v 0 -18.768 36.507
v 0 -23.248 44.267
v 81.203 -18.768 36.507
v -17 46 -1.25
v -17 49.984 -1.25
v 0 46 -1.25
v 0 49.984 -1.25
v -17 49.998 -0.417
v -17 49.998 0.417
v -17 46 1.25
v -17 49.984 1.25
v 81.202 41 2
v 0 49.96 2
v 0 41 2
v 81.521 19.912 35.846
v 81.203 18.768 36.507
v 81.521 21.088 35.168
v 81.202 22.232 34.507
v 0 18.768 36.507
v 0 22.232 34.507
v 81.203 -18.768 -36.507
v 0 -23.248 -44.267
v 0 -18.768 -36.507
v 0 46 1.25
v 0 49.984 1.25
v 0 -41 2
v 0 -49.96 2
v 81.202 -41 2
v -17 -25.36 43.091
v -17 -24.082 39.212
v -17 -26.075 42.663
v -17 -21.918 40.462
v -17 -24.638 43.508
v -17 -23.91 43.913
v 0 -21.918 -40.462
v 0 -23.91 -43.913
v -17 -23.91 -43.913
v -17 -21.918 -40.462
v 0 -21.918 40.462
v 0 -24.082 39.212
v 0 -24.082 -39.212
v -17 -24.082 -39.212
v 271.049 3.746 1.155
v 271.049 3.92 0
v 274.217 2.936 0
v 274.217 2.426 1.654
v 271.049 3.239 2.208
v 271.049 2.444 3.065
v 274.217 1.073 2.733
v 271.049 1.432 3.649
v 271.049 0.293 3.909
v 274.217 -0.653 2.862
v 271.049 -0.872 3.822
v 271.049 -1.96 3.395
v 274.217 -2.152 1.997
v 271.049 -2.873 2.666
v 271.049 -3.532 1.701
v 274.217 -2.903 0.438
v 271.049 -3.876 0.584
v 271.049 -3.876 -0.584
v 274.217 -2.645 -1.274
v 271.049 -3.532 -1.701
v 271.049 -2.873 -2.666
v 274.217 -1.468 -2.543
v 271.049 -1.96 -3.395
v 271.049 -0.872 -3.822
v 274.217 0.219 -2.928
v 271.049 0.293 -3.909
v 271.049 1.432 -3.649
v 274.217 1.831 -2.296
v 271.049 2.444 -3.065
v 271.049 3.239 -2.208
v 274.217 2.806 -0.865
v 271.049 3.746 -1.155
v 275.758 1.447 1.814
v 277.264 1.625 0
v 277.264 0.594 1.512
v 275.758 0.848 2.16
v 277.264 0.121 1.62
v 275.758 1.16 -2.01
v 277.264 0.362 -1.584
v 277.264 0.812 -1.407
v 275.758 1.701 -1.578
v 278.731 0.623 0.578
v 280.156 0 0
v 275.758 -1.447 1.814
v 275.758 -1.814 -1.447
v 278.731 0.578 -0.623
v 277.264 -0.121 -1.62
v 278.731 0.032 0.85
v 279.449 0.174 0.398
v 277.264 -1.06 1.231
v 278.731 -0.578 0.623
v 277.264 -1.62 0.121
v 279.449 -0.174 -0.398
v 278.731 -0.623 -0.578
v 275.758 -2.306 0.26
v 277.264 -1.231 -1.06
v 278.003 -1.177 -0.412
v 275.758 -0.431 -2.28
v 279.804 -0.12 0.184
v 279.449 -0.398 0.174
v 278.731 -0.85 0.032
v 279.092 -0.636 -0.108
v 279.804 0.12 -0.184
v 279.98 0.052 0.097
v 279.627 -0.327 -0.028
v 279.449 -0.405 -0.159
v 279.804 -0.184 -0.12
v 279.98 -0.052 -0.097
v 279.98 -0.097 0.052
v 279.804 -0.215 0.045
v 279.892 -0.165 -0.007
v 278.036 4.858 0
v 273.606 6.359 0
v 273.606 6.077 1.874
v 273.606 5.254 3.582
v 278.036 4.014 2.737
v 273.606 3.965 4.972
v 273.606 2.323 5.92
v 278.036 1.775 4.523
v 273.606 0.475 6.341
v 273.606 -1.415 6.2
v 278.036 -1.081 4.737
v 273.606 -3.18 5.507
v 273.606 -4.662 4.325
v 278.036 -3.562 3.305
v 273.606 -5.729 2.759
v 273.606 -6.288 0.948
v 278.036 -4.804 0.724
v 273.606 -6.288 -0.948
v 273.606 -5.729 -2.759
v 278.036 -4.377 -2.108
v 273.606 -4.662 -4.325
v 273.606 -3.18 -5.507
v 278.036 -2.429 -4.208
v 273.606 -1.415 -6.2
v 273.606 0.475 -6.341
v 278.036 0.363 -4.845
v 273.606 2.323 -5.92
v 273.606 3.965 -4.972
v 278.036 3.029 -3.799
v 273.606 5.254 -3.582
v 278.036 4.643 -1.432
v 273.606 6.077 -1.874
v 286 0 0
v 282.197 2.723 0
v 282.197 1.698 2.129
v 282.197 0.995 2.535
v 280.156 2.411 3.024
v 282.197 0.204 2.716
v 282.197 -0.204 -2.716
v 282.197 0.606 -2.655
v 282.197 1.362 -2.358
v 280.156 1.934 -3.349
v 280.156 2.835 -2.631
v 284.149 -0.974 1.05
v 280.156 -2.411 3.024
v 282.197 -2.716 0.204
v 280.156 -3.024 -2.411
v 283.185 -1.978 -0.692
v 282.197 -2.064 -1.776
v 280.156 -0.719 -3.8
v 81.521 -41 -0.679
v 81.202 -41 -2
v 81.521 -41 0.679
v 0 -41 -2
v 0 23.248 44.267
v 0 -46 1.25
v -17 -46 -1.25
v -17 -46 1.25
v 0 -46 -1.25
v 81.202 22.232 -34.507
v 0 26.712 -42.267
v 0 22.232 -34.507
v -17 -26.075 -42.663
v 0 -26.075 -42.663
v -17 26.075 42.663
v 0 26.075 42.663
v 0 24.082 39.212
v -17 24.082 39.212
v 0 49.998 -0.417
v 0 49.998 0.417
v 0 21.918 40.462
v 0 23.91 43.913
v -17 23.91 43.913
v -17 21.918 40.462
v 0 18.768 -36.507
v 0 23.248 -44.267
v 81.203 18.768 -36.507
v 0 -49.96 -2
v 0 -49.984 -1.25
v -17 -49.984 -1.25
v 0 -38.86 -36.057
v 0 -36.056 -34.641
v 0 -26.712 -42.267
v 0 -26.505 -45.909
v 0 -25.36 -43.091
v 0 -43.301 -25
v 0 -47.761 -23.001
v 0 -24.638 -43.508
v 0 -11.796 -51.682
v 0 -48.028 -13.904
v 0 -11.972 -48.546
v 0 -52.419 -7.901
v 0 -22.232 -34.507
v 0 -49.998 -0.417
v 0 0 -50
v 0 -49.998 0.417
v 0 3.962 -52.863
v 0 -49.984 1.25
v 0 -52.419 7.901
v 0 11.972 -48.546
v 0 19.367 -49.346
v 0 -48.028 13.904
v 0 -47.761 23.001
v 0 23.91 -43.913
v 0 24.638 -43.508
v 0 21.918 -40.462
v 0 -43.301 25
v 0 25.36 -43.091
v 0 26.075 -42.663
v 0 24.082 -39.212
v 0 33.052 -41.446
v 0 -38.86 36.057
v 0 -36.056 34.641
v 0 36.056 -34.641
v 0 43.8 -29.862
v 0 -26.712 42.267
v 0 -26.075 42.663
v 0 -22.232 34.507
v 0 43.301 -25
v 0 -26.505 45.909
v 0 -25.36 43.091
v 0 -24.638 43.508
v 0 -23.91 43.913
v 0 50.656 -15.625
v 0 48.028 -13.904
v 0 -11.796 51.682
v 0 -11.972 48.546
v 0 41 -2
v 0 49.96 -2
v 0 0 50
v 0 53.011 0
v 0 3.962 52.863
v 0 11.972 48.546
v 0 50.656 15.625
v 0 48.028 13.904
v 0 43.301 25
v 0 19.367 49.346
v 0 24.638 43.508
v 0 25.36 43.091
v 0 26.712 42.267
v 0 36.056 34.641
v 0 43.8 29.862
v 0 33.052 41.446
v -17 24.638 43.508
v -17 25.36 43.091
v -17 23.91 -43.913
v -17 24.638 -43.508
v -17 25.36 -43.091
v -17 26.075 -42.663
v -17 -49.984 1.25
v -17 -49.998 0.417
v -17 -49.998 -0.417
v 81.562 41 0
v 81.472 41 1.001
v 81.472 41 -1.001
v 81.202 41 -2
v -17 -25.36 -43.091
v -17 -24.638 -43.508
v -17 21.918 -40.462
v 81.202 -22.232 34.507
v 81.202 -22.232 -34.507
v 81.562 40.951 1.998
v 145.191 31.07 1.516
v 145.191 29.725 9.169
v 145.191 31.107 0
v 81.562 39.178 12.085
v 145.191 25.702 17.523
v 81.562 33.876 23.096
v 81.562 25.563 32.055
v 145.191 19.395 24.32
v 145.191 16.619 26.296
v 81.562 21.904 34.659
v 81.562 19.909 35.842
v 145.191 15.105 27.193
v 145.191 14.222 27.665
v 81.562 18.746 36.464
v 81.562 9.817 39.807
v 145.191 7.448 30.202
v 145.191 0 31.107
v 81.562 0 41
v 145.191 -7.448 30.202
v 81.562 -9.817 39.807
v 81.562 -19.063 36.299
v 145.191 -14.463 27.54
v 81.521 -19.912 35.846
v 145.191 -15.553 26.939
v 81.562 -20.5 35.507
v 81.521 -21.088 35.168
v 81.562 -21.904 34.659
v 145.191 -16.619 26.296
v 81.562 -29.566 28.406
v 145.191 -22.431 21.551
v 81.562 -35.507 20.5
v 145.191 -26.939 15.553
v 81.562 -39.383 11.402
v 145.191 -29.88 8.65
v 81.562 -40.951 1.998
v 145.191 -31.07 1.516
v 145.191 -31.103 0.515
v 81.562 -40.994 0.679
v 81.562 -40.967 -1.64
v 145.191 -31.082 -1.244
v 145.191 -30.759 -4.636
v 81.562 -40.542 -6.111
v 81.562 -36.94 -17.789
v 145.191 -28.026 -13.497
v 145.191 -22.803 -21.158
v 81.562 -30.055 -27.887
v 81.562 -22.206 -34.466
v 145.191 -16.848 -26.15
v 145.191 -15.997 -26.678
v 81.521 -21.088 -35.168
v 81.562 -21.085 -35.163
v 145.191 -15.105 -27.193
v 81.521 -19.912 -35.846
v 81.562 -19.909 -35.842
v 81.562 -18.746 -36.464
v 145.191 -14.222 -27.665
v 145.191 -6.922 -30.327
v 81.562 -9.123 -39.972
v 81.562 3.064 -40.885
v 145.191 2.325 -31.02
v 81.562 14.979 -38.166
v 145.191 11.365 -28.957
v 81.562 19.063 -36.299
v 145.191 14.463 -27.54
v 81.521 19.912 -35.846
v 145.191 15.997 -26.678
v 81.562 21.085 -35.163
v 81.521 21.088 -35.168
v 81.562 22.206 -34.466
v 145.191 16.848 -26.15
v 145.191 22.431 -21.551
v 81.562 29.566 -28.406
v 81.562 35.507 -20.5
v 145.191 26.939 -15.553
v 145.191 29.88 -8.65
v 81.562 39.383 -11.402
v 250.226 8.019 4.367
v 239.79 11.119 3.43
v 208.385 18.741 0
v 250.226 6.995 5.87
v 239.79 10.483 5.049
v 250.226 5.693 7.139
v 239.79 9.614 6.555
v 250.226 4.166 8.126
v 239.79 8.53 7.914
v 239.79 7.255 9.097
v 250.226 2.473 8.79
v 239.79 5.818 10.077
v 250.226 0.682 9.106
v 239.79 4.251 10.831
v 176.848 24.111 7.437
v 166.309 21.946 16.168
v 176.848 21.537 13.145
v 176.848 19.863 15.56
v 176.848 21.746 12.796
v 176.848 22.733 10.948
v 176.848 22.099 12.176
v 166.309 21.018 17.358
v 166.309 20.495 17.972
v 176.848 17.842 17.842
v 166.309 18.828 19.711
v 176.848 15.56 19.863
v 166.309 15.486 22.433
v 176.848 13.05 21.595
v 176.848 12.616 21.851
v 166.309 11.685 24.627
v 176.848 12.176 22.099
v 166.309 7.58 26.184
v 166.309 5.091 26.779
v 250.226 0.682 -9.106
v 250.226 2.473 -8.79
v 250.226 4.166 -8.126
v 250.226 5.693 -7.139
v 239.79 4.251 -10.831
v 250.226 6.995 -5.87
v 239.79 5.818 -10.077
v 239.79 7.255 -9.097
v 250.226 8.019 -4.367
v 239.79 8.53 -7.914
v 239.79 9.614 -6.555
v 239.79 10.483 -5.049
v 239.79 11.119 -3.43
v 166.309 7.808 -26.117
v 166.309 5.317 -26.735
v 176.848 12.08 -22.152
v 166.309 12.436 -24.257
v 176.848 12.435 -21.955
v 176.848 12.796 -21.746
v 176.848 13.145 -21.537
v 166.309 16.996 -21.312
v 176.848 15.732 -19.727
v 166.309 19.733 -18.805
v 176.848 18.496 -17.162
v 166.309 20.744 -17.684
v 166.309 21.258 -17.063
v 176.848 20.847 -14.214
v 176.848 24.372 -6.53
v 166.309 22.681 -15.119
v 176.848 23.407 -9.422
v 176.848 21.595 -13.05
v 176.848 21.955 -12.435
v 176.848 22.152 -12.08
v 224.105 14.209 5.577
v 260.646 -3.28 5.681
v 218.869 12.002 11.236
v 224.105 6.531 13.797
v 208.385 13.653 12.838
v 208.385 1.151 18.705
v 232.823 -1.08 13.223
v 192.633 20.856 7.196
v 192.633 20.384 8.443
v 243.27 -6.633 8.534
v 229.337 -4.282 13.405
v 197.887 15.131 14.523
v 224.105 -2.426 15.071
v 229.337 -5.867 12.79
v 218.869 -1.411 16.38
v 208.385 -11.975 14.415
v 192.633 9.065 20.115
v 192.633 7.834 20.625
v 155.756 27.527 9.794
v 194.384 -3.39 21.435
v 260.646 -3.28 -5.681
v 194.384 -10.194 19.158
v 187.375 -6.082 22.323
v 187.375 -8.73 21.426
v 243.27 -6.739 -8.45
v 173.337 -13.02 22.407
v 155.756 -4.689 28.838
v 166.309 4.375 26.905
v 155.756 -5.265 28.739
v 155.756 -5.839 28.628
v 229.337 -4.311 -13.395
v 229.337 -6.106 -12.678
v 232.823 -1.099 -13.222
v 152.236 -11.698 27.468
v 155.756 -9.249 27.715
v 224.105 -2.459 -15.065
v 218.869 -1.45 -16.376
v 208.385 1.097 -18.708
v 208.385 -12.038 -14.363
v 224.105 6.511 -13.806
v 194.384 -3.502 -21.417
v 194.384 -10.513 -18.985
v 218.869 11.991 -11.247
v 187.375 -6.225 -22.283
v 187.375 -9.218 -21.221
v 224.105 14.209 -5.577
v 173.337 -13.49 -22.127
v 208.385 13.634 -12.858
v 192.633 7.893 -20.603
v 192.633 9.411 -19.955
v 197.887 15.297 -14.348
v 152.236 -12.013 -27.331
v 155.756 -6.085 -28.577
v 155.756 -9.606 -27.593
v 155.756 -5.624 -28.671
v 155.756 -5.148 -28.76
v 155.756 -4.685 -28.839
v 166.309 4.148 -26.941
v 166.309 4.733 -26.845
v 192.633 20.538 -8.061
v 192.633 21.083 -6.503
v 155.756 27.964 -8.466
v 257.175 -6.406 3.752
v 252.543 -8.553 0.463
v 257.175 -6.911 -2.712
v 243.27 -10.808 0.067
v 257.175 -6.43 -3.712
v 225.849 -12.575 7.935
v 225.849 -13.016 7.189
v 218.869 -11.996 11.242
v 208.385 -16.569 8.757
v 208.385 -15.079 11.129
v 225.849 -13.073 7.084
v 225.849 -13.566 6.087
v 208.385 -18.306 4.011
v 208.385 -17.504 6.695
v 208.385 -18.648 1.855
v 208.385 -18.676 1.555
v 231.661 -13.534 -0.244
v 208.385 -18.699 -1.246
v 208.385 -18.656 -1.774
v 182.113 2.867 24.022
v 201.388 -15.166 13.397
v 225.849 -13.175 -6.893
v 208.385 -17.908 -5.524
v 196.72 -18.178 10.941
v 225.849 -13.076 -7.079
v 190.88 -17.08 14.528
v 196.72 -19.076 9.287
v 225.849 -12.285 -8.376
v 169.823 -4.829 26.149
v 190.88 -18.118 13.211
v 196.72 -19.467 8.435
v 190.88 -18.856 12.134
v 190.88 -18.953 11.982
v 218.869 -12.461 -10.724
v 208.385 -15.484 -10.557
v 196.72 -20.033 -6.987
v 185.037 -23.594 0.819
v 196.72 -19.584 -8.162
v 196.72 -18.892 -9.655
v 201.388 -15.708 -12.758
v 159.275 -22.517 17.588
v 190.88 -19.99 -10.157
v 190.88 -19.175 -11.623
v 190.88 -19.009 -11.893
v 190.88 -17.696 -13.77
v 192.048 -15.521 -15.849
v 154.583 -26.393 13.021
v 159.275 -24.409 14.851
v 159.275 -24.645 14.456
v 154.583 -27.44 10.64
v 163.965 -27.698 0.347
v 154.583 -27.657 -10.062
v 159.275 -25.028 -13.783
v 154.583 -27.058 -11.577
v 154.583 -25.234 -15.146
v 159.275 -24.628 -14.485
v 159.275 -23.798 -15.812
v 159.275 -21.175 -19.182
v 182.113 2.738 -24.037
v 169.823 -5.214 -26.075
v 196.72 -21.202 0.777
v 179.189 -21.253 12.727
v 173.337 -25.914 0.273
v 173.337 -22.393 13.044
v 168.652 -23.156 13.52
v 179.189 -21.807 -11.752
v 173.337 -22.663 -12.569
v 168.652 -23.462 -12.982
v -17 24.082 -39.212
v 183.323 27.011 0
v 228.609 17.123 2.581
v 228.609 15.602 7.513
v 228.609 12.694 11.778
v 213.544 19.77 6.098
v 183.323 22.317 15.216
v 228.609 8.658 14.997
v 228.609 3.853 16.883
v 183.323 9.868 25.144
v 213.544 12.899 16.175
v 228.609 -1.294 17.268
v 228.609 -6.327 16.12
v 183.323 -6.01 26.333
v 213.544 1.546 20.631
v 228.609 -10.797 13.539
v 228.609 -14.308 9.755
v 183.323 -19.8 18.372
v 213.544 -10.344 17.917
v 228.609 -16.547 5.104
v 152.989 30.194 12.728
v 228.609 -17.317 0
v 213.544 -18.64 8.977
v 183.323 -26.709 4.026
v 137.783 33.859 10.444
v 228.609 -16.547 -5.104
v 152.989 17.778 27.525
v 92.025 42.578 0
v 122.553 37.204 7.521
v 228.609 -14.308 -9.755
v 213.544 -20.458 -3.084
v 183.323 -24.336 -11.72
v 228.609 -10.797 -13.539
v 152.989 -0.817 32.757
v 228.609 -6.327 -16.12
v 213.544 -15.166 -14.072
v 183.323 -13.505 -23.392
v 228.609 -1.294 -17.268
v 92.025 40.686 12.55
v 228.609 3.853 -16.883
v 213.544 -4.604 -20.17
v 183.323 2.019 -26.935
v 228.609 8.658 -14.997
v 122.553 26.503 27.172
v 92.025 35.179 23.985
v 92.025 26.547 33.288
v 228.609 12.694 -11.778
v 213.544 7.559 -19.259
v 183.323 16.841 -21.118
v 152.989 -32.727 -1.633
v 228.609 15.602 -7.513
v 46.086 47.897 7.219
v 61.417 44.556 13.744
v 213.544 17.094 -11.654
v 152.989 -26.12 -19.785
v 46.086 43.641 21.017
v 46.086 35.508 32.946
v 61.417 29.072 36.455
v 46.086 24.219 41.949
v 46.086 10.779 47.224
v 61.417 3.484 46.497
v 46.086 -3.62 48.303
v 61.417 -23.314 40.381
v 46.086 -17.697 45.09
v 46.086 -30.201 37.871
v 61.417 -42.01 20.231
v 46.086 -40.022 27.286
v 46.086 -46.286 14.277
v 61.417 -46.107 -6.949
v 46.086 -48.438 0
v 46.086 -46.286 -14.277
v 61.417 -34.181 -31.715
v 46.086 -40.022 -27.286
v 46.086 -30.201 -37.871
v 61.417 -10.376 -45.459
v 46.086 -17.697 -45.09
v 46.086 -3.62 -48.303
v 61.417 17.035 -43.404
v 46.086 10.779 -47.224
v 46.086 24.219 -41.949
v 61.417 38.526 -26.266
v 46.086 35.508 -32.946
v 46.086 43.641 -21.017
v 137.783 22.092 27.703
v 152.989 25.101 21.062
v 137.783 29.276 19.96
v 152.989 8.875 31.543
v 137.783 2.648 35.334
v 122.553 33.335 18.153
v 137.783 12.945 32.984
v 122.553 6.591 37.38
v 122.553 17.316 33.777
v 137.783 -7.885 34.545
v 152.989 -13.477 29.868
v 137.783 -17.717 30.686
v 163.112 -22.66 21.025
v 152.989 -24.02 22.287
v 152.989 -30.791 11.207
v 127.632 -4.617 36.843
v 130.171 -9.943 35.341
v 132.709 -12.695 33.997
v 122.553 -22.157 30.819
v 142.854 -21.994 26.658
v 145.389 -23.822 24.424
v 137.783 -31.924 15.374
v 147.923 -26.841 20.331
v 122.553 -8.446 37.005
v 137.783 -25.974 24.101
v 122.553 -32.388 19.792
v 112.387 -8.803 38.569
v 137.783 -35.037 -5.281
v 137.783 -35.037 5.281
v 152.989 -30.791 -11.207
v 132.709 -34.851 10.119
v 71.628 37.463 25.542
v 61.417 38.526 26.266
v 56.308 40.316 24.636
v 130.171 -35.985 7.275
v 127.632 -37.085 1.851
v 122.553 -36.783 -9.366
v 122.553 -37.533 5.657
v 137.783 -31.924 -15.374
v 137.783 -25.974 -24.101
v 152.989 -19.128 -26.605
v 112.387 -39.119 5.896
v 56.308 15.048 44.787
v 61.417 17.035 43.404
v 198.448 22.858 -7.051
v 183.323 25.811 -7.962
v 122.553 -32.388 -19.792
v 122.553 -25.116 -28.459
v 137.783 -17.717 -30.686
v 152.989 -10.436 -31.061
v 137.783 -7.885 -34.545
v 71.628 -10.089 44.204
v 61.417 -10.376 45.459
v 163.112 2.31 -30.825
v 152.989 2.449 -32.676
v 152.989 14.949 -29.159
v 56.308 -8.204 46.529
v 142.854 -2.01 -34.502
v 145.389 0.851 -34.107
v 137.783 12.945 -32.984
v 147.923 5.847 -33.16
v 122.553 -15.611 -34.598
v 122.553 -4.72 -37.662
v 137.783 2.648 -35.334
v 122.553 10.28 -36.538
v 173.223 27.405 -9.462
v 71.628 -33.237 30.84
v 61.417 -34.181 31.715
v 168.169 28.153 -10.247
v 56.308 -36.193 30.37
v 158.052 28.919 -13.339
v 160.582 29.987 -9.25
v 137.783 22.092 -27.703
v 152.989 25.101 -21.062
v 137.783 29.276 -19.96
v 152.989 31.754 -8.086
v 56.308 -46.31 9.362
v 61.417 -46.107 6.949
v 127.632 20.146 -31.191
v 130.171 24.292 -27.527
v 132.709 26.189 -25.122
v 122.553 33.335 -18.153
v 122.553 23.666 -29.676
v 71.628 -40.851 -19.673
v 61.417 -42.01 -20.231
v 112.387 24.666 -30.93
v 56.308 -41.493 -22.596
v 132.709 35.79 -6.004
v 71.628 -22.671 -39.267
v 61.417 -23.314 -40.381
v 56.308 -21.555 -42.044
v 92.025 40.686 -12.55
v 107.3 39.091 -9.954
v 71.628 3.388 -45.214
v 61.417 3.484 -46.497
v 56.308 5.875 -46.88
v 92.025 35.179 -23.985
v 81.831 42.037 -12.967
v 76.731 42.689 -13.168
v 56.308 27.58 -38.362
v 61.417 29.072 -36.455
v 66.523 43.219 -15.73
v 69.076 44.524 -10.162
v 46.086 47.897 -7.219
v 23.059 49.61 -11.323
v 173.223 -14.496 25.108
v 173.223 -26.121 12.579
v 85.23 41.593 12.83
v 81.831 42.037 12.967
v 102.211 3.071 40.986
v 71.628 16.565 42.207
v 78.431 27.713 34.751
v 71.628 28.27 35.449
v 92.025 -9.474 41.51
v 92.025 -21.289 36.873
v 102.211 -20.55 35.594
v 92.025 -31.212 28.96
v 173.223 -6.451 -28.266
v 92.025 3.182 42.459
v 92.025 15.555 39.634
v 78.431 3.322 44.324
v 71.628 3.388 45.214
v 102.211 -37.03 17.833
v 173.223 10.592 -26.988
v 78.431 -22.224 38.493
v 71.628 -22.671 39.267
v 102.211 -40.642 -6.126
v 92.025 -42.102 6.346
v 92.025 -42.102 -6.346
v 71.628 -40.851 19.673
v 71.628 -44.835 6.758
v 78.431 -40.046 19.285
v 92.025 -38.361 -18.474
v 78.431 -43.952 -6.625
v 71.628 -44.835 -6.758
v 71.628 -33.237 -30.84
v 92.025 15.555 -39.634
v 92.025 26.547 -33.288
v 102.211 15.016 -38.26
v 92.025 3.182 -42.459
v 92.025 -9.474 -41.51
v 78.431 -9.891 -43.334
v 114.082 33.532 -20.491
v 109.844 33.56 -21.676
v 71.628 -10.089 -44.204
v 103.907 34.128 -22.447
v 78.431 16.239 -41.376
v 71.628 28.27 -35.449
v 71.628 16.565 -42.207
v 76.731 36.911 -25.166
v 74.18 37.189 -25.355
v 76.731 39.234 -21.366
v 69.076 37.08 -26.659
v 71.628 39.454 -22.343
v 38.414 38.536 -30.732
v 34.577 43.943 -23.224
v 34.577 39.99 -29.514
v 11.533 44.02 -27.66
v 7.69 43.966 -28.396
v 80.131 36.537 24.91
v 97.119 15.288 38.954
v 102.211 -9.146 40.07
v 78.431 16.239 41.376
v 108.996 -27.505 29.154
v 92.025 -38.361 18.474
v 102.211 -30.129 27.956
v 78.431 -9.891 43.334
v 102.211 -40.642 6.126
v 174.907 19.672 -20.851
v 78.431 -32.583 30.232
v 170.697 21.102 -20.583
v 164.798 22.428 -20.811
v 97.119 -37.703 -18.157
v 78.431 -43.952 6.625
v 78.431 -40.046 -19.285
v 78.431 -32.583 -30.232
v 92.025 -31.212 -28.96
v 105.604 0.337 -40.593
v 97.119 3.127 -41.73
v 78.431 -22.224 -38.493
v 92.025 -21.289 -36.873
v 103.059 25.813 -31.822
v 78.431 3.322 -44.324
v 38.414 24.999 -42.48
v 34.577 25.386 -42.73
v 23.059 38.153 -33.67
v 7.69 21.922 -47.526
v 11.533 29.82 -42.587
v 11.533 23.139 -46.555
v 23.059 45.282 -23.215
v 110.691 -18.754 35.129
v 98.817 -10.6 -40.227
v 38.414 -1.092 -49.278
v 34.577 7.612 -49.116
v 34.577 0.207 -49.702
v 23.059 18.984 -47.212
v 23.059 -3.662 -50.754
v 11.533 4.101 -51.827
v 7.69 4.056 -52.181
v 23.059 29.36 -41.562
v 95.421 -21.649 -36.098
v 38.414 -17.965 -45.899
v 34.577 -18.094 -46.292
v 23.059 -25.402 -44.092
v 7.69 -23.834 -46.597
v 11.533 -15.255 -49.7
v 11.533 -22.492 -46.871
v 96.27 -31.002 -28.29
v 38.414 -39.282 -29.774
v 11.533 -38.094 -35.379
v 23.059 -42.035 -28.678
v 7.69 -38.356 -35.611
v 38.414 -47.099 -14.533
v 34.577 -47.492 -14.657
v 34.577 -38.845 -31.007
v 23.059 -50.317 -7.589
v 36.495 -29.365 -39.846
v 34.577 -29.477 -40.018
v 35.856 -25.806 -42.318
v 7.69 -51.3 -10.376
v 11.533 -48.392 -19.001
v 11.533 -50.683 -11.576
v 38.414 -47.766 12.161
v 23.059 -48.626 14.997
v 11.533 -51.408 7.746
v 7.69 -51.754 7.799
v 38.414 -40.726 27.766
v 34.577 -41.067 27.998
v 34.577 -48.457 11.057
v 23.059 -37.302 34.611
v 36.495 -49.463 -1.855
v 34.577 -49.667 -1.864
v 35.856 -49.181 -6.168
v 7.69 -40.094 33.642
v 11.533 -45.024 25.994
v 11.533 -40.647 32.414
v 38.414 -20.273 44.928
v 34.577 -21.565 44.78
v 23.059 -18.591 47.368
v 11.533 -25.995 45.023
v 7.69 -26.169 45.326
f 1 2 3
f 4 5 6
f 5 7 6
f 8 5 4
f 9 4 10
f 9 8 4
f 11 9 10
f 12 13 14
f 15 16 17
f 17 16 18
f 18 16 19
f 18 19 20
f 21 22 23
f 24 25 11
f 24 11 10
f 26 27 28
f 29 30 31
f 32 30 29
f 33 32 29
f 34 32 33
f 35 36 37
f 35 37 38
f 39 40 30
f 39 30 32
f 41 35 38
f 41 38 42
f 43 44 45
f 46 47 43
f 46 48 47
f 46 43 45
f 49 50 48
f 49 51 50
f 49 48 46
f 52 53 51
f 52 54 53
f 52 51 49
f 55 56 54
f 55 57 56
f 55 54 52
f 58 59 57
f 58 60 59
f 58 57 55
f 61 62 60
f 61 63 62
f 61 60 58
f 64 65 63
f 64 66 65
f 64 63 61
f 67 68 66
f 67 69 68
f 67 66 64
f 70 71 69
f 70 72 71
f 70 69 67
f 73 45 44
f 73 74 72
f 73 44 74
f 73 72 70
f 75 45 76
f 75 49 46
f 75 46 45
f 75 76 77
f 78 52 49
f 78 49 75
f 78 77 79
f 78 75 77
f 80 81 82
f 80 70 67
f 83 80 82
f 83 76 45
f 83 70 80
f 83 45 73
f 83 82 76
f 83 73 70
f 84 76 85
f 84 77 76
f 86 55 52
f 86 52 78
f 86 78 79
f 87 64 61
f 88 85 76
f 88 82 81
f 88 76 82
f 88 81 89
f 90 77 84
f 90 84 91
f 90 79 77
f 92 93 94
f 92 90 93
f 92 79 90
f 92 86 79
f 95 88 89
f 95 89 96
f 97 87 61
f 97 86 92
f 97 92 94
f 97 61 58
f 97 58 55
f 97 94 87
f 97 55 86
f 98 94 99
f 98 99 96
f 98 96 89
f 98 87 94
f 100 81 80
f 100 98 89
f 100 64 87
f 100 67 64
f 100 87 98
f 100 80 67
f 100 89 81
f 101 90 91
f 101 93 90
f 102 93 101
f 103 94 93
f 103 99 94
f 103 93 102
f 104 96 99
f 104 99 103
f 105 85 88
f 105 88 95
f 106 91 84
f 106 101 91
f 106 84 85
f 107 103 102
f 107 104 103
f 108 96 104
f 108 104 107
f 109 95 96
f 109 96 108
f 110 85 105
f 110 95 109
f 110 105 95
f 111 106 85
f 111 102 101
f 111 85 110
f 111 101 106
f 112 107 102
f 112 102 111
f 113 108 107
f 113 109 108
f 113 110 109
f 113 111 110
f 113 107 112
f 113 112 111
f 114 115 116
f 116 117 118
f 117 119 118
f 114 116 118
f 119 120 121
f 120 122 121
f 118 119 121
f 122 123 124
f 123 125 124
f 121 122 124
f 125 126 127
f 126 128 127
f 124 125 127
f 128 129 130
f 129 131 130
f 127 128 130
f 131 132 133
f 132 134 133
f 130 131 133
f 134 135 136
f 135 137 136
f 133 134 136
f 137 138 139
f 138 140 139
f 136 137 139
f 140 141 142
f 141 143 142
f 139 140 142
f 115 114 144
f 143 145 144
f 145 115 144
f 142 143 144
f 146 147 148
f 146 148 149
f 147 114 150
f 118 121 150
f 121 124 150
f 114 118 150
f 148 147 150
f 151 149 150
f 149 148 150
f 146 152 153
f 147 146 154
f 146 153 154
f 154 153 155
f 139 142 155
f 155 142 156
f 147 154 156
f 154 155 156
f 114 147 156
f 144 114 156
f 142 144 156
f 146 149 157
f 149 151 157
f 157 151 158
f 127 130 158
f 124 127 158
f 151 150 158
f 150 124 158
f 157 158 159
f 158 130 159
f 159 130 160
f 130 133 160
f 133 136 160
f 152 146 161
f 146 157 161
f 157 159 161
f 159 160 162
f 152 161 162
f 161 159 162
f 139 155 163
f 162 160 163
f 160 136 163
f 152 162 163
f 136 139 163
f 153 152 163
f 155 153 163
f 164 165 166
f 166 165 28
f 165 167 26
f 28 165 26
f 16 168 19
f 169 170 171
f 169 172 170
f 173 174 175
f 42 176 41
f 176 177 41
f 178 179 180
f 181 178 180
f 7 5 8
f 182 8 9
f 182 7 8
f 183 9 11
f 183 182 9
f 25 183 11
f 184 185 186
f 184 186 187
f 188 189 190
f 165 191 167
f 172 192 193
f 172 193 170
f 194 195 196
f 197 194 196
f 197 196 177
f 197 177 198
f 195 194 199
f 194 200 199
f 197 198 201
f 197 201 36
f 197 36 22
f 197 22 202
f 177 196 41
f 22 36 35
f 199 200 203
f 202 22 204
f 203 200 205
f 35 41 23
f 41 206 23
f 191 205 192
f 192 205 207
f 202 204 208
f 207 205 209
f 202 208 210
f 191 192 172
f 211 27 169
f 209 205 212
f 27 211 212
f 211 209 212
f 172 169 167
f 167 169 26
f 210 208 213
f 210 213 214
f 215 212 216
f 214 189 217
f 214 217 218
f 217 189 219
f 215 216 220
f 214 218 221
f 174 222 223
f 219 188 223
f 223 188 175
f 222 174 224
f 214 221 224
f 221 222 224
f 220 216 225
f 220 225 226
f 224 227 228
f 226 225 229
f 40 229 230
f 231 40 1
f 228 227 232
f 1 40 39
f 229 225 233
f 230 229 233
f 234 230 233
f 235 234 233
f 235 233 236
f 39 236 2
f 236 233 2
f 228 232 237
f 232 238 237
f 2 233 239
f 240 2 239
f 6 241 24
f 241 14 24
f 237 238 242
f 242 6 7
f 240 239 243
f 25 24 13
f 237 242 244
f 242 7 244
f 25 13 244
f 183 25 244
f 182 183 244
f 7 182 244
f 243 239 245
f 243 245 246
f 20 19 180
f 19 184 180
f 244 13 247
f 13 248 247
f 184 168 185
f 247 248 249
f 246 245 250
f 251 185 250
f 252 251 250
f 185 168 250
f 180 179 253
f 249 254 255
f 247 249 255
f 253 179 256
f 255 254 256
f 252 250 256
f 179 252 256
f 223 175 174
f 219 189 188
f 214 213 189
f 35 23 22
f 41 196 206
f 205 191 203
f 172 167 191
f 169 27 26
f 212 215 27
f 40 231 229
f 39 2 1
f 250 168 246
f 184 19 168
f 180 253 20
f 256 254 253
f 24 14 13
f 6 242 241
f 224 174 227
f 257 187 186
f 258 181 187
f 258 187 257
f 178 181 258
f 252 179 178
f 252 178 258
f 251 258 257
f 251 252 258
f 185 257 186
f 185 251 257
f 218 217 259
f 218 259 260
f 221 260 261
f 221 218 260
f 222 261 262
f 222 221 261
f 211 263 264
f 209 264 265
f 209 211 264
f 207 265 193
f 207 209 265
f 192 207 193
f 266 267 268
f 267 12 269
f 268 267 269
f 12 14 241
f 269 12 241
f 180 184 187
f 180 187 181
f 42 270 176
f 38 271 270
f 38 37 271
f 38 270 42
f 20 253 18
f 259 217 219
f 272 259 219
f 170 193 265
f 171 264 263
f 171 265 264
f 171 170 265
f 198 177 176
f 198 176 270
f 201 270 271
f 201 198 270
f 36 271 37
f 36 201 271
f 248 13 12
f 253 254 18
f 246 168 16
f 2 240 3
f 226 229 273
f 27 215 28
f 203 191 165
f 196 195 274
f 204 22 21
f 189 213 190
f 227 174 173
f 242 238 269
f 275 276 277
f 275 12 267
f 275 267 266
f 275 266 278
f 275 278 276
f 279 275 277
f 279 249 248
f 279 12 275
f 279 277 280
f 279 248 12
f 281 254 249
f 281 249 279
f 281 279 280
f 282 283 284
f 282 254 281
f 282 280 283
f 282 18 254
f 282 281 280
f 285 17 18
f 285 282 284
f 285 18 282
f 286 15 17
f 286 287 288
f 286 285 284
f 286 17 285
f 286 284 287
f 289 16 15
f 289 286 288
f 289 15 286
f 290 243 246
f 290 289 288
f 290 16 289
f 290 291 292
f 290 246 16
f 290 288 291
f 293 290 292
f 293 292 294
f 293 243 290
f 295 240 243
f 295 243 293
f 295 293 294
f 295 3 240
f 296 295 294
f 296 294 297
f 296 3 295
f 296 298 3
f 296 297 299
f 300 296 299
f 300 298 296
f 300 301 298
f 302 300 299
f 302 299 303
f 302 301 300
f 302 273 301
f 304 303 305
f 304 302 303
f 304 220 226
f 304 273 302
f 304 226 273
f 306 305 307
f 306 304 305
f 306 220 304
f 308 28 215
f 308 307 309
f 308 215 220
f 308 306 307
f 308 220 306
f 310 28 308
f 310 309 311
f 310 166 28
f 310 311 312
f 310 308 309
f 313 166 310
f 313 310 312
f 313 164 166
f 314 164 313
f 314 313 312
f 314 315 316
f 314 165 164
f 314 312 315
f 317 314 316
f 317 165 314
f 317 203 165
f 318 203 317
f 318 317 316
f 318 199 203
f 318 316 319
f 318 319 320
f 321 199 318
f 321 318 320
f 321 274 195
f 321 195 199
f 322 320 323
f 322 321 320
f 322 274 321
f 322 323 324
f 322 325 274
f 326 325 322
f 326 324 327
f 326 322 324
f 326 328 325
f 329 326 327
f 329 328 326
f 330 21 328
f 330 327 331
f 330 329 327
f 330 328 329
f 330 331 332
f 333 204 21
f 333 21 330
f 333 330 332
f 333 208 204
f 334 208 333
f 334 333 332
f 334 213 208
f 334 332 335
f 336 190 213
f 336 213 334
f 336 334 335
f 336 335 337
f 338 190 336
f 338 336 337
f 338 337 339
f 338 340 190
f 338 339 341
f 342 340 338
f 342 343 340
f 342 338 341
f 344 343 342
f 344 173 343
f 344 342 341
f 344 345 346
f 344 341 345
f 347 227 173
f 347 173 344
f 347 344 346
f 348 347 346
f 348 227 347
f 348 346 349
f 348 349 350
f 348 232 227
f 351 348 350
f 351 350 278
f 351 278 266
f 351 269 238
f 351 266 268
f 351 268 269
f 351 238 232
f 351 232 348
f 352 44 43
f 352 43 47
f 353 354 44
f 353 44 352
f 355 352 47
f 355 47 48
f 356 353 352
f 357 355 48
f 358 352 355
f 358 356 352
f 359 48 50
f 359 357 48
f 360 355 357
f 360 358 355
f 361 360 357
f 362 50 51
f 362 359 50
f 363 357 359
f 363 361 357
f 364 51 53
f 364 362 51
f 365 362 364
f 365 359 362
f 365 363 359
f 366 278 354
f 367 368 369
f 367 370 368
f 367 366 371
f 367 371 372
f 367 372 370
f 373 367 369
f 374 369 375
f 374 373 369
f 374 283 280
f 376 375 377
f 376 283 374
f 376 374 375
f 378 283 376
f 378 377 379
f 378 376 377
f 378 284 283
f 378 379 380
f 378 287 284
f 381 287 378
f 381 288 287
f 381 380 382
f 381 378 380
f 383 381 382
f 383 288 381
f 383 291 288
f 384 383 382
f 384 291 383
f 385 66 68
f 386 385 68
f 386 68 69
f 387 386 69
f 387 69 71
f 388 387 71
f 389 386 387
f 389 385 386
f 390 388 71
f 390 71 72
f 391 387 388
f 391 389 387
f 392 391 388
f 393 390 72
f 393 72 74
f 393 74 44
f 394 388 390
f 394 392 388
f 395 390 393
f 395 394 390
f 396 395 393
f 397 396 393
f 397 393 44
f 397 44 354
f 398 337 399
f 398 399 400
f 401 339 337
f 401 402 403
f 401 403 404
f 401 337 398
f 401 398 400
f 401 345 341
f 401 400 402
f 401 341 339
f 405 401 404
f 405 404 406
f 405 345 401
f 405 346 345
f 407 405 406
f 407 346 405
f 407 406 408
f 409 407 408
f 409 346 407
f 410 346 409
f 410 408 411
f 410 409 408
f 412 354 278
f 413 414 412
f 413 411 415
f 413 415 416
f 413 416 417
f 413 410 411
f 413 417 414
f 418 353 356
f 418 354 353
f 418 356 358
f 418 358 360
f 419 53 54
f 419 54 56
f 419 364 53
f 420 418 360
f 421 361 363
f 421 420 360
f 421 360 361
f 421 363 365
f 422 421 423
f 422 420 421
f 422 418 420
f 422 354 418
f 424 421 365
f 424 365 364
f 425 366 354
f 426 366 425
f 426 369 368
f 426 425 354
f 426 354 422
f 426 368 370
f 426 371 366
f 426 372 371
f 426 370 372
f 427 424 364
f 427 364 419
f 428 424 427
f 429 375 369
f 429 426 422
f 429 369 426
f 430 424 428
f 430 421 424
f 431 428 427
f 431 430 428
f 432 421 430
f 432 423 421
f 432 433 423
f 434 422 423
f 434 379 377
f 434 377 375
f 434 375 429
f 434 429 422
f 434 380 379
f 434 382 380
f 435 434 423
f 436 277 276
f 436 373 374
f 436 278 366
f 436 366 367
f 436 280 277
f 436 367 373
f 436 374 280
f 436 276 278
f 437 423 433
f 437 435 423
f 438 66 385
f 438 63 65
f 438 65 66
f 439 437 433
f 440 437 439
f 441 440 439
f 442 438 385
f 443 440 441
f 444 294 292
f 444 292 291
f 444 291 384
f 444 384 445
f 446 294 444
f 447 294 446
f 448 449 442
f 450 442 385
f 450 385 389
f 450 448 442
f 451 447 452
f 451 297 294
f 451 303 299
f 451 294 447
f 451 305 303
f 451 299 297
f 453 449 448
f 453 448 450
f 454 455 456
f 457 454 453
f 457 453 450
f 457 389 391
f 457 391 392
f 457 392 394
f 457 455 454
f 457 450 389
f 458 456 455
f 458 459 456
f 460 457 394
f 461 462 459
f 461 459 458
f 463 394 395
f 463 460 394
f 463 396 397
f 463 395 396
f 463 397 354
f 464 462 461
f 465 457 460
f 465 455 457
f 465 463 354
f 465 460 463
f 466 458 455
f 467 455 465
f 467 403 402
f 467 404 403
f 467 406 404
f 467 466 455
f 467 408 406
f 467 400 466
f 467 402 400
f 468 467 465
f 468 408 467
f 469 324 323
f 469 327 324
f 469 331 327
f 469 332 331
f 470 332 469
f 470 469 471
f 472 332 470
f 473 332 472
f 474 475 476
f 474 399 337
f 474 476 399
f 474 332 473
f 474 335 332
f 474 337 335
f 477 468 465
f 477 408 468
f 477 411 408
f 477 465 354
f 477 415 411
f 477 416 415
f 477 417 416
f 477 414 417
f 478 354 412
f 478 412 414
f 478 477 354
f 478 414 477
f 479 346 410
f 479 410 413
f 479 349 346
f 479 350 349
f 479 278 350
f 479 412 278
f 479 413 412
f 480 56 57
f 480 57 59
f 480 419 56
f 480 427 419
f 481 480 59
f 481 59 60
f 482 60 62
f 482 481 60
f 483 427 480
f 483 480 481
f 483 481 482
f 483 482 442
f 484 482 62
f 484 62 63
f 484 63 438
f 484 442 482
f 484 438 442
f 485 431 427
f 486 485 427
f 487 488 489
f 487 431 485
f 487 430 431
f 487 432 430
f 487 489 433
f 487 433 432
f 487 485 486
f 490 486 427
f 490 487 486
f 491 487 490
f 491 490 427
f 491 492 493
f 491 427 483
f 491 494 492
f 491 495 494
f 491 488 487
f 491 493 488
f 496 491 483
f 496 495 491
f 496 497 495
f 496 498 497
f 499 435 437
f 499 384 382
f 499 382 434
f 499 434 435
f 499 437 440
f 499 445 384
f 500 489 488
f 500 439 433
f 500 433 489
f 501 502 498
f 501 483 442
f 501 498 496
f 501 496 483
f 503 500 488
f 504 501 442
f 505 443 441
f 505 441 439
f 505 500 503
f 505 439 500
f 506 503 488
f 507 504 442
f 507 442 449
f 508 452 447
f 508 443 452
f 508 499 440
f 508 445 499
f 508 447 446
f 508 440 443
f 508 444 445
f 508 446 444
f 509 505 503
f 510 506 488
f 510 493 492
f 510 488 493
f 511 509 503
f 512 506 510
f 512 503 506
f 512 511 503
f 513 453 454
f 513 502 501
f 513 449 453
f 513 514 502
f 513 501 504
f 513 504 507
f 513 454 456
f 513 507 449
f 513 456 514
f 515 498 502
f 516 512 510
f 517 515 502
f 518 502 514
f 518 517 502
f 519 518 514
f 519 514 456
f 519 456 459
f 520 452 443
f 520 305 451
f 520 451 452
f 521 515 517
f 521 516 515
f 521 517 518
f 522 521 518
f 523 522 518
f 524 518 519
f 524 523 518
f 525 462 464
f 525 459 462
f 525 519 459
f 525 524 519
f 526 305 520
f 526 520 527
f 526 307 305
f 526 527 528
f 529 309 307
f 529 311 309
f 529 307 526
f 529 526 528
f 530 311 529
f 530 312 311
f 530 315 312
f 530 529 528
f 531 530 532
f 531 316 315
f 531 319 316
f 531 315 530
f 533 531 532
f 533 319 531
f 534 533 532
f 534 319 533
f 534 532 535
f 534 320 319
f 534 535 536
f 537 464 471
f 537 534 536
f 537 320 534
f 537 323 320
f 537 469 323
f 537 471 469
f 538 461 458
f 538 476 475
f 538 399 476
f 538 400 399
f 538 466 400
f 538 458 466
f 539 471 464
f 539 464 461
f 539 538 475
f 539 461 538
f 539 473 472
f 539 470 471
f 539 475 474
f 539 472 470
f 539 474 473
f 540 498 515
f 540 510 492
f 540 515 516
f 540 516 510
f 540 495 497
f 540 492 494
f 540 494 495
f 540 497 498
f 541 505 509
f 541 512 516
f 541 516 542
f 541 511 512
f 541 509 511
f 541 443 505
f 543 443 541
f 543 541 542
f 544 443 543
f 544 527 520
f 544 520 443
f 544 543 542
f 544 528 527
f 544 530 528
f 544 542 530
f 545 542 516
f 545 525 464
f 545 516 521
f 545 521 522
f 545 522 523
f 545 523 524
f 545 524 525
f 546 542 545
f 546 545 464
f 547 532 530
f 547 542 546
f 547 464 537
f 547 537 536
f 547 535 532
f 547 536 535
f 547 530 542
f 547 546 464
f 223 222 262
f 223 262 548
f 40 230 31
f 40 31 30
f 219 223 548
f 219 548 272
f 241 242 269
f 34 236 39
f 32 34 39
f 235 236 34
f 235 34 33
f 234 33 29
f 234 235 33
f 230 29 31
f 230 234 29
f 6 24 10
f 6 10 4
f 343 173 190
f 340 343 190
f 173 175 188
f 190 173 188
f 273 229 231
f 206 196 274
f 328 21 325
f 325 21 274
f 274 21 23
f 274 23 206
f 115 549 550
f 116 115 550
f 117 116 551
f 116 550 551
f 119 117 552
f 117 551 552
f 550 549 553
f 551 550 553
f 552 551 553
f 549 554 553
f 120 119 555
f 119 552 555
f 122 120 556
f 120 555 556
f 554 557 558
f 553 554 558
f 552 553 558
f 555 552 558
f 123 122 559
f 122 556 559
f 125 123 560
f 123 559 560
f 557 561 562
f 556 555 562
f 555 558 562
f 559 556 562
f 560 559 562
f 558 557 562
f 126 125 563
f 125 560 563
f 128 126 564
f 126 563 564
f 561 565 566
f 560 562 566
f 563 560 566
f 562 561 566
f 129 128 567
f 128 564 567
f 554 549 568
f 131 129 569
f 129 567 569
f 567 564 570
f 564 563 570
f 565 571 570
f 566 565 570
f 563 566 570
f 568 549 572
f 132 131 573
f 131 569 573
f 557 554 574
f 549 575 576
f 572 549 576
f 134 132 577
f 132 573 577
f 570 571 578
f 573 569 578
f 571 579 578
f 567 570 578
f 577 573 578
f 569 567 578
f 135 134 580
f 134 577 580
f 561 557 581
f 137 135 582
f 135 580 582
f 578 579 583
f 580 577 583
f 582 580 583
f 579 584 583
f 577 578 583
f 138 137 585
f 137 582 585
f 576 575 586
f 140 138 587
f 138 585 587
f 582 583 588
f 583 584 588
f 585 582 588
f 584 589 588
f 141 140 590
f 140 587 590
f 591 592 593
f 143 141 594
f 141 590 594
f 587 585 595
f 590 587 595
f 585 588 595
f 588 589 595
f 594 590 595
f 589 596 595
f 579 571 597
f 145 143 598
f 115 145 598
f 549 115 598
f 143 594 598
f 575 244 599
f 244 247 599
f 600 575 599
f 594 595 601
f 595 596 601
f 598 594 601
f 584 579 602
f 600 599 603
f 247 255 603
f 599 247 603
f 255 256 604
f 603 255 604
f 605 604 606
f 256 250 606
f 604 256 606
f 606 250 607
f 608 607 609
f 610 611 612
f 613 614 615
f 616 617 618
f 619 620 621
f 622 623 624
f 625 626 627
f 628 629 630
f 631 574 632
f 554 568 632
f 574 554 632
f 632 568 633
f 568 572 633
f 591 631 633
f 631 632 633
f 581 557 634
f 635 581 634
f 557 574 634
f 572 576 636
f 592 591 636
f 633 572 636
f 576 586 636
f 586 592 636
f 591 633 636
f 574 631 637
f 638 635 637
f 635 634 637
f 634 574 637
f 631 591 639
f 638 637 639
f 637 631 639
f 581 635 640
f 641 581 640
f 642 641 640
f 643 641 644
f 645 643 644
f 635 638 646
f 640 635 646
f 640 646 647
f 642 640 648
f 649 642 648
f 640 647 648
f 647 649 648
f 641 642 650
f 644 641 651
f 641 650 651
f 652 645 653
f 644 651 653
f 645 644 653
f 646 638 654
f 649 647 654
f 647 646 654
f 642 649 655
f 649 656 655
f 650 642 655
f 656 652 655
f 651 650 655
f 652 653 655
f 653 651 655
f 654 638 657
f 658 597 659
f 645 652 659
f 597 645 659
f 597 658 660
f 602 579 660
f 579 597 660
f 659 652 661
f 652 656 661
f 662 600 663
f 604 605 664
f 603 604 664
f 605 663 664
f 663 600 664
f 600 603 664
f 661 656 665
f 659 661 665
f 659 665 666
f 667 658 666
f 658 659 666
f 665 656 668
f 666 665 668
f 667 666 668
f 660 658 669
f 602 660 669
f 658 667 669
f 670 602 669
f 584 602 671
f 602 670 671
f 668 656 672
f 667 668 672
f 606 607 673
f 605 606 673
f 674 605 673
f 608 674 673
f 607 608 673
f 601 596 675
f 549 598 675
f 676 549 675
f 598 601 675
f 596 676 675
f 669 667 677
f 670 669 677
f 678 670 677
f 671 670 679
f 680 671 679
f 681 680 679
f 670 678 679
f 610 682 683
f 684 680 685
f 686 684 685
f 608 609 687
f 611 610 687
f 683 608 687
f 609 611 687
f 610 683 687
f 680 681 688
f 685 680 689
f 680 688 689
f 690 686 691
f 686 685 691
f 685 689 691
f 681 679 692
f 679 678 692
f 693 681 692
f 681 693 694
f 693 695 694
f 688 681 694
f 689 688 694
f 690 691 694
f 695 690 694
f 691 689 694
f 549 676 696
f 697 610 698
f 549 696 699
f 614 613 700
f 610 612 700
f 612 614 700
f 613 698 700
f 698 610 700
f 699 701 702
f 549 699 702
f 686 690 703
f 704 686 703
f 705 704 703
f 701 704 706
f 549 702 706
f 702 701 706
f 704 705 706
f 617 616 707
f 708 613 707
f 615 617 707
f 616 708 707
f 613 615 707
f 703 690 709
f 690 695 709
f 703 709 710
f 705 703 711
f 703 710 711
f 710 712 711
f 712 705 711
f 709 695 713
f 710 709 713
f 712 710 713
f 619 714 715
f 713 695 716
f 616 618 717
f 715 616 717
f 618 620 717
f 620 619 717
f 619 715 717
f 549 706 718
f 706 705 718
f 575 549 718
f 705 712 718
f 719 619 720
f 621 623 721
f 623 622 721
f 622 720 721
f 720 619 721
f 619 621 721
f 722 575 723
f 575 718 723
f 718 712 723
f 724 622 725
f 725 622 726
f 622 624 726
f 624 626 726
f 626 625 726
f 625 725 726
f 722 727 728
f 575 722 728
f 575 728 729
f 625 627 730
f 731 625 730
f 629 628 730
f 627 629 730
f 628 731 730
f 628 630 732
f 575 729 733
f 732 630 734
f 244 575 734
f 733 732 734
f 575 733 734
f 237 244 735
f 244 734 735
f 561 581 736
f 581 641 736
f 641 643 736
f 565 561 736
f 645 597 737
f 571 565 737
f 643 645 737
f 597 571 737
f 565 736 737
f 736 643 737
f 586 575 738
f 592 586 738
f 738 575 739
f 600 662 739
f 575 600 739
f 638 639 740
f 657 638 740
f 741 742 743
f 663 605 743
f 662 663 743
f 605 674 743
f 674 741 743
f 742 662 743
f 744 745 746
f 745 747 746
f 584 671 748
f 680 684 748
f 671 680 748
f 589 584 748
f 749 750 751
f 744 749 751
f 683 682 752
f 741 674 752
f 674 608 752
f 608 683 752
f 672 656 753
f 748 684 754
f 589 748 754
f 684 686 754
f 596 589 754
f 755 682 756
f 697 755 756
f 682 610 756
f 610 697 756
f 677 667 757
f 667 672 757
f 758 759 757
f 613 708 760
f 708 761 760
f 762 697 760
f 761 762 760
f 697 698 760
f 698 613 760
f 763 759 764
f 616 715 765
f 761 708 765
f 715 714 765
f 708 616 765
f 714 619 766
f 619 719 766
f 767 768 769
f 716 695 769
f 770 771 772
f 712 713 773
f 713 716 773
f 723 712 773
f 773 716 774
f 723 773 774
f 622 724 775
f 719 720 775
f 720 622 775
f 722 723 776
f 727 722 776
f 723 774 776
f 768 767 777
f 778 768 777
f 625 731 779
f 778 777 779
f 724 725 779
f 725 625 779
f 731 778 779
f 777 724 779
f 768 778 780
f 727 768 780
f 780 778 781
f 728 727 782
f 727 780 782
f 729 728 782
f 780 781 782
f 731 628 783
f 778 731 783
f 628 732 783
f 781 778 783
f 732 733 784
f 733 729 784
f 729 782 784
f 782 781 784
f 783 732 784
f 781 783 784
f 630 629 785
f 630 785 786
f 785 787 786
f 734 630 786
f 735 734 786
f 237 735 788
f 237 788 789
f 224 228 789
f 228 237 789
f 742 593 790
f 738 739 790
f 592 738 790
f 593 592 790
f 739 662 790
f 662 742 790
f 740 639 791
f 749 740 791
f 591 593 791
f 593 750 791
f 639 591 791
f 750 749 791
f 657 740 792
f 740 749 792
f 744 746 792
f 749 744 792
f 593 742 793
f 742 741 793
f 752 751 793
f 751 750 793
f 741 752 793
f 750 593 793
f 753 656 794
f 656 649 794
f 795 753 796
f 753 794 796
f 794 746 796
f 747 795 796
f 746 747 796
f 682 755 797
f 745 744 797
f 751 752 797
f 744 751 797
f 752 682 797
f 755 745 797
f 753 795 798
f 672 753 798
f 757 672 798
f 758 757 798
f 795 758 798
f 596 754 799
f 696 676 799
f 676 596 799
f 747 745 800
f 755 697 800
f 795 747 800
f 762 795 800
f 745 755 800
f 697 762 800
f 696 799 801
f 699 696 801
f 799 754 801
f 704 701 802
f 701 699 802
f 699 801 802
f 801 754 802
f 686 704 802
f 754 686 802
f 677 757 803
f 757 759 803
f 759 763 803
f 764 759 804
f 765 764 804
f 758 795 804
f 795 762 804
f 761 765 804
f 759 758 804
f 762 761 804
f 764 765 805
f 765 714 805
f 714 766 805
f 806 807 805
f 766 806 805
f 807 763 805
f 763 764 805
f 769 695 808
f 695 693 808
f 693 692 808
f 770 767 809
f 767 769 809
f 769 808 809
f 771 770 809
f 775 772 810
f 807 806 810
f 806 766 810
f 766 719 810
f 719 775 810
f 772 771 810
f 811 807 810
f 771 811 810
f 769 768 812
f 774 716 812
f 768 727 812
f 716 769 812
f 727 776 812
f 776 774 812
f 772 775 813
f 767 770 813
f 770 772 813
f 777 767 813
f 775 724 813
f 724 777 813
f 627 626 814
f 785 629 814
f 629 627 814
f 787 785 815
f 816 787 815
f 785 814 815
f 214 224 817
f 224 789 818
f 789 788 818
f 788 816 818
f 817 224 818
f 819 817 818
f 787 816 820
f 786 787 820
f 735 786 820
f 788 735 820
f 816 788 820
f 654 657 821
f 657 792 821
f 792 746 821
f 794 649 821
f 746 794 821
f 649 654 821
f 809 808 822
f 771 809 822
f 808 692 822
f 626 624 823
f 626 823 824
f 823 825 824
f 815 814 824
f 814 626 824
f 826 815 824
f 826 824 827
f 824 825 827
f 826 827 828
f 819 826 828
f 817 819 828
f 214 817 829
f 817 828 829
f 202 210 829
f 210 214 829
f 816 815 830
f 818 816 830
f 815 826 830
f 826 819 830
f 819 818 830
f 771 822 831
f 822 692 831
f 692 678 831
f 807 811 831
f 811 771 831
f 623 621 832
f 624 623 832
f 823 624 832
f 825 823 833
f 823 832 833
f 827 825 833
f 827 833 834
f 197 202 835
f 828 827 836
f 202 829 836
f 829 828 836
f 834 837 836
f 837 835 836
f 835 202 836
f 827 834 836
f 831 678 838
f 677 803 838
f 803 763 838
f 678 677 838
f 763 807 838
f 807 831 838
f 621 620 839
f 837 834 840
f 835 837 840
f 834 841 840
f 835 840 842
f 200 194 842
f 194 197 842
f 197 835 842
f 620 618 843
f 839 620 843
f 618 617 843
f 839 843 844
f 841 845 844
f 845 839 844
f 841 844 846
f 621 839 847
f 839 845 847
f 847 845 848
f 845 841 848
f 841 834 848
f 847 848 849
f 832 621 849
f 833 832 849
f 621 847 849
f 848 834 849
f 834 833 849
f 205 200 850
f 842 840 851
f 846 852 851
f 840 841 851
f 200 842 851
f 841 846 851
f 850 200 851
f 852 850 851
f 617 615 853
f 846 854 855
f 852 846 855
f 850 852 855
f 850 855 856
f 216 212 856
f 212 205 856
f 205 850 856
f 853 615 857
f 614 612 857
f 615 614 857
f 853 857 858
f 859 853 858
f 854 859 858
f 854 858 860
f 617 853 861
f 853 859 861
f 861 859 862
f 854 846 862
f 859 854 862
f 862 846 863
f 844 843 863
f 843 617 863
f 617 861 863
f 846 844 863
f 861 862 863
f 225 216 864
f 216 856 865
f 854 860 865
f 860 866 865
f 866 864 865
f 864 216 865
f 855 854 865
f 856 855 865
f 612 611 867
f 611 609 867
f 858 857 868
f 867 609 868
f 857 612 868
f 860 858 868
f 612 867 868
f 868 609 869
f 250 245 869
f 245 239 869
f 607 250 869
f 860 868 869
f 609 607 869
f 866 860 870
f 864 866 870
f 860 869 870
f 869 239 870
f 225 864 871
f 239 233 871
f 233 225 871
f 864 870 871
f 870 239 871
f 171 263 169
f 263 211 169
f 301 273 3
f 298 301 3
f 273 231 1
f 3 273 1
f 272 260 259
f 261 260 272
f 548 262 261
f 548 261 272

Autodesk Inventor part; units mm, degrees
ref_plane "YZ Plane" through (0, 0, 0) normal (1, 0, 0) x (0, 1, 0)
ref_plane "XZ Plane" through (0, 0, 0) normal (0, 1, 0) x (-1, 0, 0)
ref_plane "XY Plane" through (0, 0, 0) normal (0, 0, 1) x (1, 0, 0)
sketch "Sketch1" plane through (0, 0, 0) normal (0, 0, 1) x (1, 0, 0)
  line L0 (0, 0) -> (286, 0)
  arc A0 (271.0494, 3.9199) -> (0, 50) centre (-140.2784, -1595.3524) ccw
  arc A1 (273.6055, 6.3591) -> (0, 53.0109) centre (-140.2784, -1595.3524) ccw
  arc A2 (286, 0) -> (273.6055, 6.3591) centre (265.6617, -24.3829) ccw
  arc A3 (280.1558, 0) -> (271.0494, 3.9199) centre (263.3021, -26.6152) ccw
  line L1 (-3, 0) -> (0, 0)
  line L2 (0, 50) -> (0, 53.0109)
  dimension "d0" = 286
  dimension "d1" = 50
  dimension "d2" = 3
revolve "Revolution1" add sketch "Sketch1" angle 360 about axis through (0, 0, 0) along (1, 0, 0)
sketch "Sketch2" plane through (0, 0, 0) normal (-1, 0, 0) x (0, 0, 1)
  circle A0 centre (0, 0) radius 50 projected
  line L0 (0, 50) -> (2, 50)
  line L1 (2, 50) -> (2, 41)
  line L2 (2, 41) -> (0, 41)
  line L3 (0, 50) -> (-2, 50)
  line L4 (-2, 50) -> (-2, 41)
  line L5 (-2, 41) -> (0, 41)
  line L6 (-43.3013, 25) -> (-42.3013, 26.7321)
  line L7 (-42.3013, 26.7321) -> (-34.507, 22.2321)
  line L8 (-34.507, 22.2321) -> (-35.507, 20.5)
  line L9 (-43.3013, 25) -> (-44.3013, 23.2679)
  line L10 (-44.3013, 23.2679) -> (-36.507, 18.7679)
  line L11 (-36.507, 18.7679) -> (-35.507, 20.5)
  line L12 (-43.3013, -25) -> (-44.3013, -23.2679)
  line L13 (-44.3013, -23.2679) -> (-36.507, -18.7679)
  line L14 (-36.507, -18.7679) -> (-35.507, -20.5)
  line L15 (-43.3013, -25) -> (-42.3013, -26.7321)
  line L16 (-42.3013, -26.7321) -> (-34.507, -22.2321)
  line L17 (-34.507, -22.2321) -> (-35.507, -20.5)
  line L18 (0, -50) -> (-2, -50)
  line L19 (-2, -50) -> (-2, -41)
  line L20 (-2, -41) -> (0, -41)
  line L21 (0, -50) -> (2, -50)
  line L22 (2, -50) -> (2, -41)
  line L23 (2, -41) -> (0, -41)
  line L24 (43.3013, -25) -> (42.3013, -26.7321)
  line L25 (42.3013, -26.7321) -> (34.507, -22.2321)
  line L26 (34.507, -22.2321) -> (35.507, -20.5)
  line L27 (43.3013, -25) -> (44.3013, -23.2679)
  line L28 (44.3013, -23.2679) -> (36.507, -18.7679)
  line L29 (36.507, -18.7679) -> (35.507, -20.5)
  line L30 (43.3013, 25) -> (44.3013, 23.2679)
  line L31 (44.3013, 23.2679) -> (36.507, 18.7679)
  line L32 (36.507, 18.7679) -> (35.507, 20.5)
  line L33 (43.3013, 25) -> (42.3013, 26.7321)
  line L34 (42.3013, 26.7321) -> (34.507, 22.2321)
  line L35 (34.507, 22.2321) -> (35.507, 20.5)
  point P0 (-44.2666, -23.2479)
  point P1 (-42.2666, -26.712)
  point P2 (0, -41)
  point P3 (-2, -49.96)
  point P4 (2, -49.96)
  point P5 (42.2666, -26.712)
  point P6 (44.2666, -23.2479)
  point P7 (-42.2666, 26.712)
  point P8 (-44.2666, 23.2479)
  point P9 (44.2666, 23.2479)
  point P10 (42.2666, 26.712)
  point P11 (2, 49.96)
  point P12 (-2, 49.96)
  dimension "d4" = 2
  dimension "d5" = 9
  dimension "d6" = 2
  dimension "d9" = 360
extrude "Extrusion1" add sketch "Sketch2" against normal up to next contours L31 L32 L35 L34 A0 | A0 L25 L26 L29 L28 | L1 L2 L5 L4 A0 | A0 L19 L20 L23 L22 | L7 L8 L11 L10 A0 | A0 L13 L14 L17 L16
sketch "Sketch4" plane through (0, 0, 0) normal (-1, 0, 0) x (0, 0, 1)
  circle A0 centre (0, 0) radius 3.9199 projected
  circle A1 centre (0, 0) radius 50
  line L0 (0, 50) -> (1.25, 50)
  line L1 (1.25, 50) -> (1.25, 46)
  line L2 (1.25, 46) -> (0, 46)
  line L3 (0, 50) -> (-1.25, 50)
  line L4 (-1.25, 50) -> (-1.25, 46)
  line L5 (-1.25, 46) -> (0, 46)
  line L6 (-43.3013, 25) -> (-42.6763, 26.0825)
  line L7 (-42.6763, 26.0825) -> (-39.2122, 24.0825)
  line L8 (-39.2122, 24.0825) -> (-39.8372, 23)
  line L9 (-43.3013, 25) -> (-43.9263, 23.9175)
  line L10 (-43.9263, 23.9175) -> (-40.4622, 21.9175)
  line L11 (-40.4622, 21.9175) -> (-39.8372, 23)
  line L12 (-43.3013, -25) -> (-43.9263, -23.9175)
  line L13 (-43.9263, -23.9175) -> (-40.4622, -21.9175)
  line L14 (-40.4622, -21.9175) -> (-39.8372, -23)
  line L15 (-43.3013, -25) -> (-42.6763, -26.0825)
  line L16 (-42.6763, -26.0825) -> (-39.2122, -24.0825)
  line L17 (-39.2122, -24.0825) -> (-39.8372, -23)
  line L18 (0, -50) -> (-1.25, -50)
  line L19 (-1.25, -50) -> (-1.25, -46)
  line L20 (-1.25, -46) -> (0, -46)
  line L21 (0, -50) -> (1.25, -50)
  line L22 (1.25, -50) -> (1.25, -46)
  line L23 (1.25, -46) -> (0, -46)
  line L24 (43.3013, -25) -> (42.6763, -26.0825)
  line L25 (42.6763, -26.0825) -> (39.2122, -24.0825)
  line L26 (39.2122, -24.0825) -> (39.8372, -23)
  line L27 (43.3013, -25) -> (43.9263, -23.9175)
  line L28 (43.9263, -23.9175) -> (40.4622, -21.9175)
  line L29 (40.4622, -21.9175) -> (39.8372, -23)
  line L30 (43.3013, 25) -> (43.9263, 23.9175)
  line L31 (43.9263, 23.9175) -> (40.4622, 21.9175)
  line L32 (40.4622, 21.9175) -> (39.8372, 23)
  line L33 (43.3013, 25) -> (42.6763, 26.0825)
  line L34 (42.6763, 26.0825) -> (39.2122, 24.0825)
  line L35 (39.2122, 24.0825) -> (39.8372, 23)
  point P0 (-42.6627, 26.0747)
  point P1 (-43.9127, 23.9097)
  point P2 (-43.9127, -23.9097)
  point P3 (-42.6627, -26.0747)
  point P4 (0, -46)
  point P5 (-1.25, -49.9844)
  point P6 (1.25, -49.9844)
  point P7 (42.6627, -26.0747)
  point P8 (43.9127, -23.9097)
  point P9 (43.9127, 23.9097)
  point P10 (42.6627, 26.0747)
  point P11 (1.25, 49.9844)
  point P12 (-1.25, 49.9844)
  dimension "d29" = 1.25
  dimension "d30" = 4
  dimension "d31" = 1.25
  dimension "d34" = 360
extrude "Extrusion3" add sketch "Sketch4" along normal blind 17 contours L31 L32 L35 L34 A1 | A1 L25 L26 L29 L28 | L1 L2 L5 L4 A1 | A1 L19 L20 L23 L22 | L7 L8 L11 L10 A1 | A1 L13 L14 L17 L16
equation "\"BendRadius\" = Thickness"
equation "\"BendReliefWidth\" = Thickness"
equation "\"BendReliefDepth\" = 0.5 * Thickness"
equation "\"CornerReliefSize\" = 4 * Thickness"
equation "\"MinimumRemnant\" = 2 * Thickness"
equation "\"TransitionRadius\" = BendRadius"
equation "\"JacobiRadiusSize\" = BendRadius"
equation "\"GapSize\" = Thickness"
equation "\"Thickness\" = 0.5"
properties part number "Nosecone(finale)tip"
